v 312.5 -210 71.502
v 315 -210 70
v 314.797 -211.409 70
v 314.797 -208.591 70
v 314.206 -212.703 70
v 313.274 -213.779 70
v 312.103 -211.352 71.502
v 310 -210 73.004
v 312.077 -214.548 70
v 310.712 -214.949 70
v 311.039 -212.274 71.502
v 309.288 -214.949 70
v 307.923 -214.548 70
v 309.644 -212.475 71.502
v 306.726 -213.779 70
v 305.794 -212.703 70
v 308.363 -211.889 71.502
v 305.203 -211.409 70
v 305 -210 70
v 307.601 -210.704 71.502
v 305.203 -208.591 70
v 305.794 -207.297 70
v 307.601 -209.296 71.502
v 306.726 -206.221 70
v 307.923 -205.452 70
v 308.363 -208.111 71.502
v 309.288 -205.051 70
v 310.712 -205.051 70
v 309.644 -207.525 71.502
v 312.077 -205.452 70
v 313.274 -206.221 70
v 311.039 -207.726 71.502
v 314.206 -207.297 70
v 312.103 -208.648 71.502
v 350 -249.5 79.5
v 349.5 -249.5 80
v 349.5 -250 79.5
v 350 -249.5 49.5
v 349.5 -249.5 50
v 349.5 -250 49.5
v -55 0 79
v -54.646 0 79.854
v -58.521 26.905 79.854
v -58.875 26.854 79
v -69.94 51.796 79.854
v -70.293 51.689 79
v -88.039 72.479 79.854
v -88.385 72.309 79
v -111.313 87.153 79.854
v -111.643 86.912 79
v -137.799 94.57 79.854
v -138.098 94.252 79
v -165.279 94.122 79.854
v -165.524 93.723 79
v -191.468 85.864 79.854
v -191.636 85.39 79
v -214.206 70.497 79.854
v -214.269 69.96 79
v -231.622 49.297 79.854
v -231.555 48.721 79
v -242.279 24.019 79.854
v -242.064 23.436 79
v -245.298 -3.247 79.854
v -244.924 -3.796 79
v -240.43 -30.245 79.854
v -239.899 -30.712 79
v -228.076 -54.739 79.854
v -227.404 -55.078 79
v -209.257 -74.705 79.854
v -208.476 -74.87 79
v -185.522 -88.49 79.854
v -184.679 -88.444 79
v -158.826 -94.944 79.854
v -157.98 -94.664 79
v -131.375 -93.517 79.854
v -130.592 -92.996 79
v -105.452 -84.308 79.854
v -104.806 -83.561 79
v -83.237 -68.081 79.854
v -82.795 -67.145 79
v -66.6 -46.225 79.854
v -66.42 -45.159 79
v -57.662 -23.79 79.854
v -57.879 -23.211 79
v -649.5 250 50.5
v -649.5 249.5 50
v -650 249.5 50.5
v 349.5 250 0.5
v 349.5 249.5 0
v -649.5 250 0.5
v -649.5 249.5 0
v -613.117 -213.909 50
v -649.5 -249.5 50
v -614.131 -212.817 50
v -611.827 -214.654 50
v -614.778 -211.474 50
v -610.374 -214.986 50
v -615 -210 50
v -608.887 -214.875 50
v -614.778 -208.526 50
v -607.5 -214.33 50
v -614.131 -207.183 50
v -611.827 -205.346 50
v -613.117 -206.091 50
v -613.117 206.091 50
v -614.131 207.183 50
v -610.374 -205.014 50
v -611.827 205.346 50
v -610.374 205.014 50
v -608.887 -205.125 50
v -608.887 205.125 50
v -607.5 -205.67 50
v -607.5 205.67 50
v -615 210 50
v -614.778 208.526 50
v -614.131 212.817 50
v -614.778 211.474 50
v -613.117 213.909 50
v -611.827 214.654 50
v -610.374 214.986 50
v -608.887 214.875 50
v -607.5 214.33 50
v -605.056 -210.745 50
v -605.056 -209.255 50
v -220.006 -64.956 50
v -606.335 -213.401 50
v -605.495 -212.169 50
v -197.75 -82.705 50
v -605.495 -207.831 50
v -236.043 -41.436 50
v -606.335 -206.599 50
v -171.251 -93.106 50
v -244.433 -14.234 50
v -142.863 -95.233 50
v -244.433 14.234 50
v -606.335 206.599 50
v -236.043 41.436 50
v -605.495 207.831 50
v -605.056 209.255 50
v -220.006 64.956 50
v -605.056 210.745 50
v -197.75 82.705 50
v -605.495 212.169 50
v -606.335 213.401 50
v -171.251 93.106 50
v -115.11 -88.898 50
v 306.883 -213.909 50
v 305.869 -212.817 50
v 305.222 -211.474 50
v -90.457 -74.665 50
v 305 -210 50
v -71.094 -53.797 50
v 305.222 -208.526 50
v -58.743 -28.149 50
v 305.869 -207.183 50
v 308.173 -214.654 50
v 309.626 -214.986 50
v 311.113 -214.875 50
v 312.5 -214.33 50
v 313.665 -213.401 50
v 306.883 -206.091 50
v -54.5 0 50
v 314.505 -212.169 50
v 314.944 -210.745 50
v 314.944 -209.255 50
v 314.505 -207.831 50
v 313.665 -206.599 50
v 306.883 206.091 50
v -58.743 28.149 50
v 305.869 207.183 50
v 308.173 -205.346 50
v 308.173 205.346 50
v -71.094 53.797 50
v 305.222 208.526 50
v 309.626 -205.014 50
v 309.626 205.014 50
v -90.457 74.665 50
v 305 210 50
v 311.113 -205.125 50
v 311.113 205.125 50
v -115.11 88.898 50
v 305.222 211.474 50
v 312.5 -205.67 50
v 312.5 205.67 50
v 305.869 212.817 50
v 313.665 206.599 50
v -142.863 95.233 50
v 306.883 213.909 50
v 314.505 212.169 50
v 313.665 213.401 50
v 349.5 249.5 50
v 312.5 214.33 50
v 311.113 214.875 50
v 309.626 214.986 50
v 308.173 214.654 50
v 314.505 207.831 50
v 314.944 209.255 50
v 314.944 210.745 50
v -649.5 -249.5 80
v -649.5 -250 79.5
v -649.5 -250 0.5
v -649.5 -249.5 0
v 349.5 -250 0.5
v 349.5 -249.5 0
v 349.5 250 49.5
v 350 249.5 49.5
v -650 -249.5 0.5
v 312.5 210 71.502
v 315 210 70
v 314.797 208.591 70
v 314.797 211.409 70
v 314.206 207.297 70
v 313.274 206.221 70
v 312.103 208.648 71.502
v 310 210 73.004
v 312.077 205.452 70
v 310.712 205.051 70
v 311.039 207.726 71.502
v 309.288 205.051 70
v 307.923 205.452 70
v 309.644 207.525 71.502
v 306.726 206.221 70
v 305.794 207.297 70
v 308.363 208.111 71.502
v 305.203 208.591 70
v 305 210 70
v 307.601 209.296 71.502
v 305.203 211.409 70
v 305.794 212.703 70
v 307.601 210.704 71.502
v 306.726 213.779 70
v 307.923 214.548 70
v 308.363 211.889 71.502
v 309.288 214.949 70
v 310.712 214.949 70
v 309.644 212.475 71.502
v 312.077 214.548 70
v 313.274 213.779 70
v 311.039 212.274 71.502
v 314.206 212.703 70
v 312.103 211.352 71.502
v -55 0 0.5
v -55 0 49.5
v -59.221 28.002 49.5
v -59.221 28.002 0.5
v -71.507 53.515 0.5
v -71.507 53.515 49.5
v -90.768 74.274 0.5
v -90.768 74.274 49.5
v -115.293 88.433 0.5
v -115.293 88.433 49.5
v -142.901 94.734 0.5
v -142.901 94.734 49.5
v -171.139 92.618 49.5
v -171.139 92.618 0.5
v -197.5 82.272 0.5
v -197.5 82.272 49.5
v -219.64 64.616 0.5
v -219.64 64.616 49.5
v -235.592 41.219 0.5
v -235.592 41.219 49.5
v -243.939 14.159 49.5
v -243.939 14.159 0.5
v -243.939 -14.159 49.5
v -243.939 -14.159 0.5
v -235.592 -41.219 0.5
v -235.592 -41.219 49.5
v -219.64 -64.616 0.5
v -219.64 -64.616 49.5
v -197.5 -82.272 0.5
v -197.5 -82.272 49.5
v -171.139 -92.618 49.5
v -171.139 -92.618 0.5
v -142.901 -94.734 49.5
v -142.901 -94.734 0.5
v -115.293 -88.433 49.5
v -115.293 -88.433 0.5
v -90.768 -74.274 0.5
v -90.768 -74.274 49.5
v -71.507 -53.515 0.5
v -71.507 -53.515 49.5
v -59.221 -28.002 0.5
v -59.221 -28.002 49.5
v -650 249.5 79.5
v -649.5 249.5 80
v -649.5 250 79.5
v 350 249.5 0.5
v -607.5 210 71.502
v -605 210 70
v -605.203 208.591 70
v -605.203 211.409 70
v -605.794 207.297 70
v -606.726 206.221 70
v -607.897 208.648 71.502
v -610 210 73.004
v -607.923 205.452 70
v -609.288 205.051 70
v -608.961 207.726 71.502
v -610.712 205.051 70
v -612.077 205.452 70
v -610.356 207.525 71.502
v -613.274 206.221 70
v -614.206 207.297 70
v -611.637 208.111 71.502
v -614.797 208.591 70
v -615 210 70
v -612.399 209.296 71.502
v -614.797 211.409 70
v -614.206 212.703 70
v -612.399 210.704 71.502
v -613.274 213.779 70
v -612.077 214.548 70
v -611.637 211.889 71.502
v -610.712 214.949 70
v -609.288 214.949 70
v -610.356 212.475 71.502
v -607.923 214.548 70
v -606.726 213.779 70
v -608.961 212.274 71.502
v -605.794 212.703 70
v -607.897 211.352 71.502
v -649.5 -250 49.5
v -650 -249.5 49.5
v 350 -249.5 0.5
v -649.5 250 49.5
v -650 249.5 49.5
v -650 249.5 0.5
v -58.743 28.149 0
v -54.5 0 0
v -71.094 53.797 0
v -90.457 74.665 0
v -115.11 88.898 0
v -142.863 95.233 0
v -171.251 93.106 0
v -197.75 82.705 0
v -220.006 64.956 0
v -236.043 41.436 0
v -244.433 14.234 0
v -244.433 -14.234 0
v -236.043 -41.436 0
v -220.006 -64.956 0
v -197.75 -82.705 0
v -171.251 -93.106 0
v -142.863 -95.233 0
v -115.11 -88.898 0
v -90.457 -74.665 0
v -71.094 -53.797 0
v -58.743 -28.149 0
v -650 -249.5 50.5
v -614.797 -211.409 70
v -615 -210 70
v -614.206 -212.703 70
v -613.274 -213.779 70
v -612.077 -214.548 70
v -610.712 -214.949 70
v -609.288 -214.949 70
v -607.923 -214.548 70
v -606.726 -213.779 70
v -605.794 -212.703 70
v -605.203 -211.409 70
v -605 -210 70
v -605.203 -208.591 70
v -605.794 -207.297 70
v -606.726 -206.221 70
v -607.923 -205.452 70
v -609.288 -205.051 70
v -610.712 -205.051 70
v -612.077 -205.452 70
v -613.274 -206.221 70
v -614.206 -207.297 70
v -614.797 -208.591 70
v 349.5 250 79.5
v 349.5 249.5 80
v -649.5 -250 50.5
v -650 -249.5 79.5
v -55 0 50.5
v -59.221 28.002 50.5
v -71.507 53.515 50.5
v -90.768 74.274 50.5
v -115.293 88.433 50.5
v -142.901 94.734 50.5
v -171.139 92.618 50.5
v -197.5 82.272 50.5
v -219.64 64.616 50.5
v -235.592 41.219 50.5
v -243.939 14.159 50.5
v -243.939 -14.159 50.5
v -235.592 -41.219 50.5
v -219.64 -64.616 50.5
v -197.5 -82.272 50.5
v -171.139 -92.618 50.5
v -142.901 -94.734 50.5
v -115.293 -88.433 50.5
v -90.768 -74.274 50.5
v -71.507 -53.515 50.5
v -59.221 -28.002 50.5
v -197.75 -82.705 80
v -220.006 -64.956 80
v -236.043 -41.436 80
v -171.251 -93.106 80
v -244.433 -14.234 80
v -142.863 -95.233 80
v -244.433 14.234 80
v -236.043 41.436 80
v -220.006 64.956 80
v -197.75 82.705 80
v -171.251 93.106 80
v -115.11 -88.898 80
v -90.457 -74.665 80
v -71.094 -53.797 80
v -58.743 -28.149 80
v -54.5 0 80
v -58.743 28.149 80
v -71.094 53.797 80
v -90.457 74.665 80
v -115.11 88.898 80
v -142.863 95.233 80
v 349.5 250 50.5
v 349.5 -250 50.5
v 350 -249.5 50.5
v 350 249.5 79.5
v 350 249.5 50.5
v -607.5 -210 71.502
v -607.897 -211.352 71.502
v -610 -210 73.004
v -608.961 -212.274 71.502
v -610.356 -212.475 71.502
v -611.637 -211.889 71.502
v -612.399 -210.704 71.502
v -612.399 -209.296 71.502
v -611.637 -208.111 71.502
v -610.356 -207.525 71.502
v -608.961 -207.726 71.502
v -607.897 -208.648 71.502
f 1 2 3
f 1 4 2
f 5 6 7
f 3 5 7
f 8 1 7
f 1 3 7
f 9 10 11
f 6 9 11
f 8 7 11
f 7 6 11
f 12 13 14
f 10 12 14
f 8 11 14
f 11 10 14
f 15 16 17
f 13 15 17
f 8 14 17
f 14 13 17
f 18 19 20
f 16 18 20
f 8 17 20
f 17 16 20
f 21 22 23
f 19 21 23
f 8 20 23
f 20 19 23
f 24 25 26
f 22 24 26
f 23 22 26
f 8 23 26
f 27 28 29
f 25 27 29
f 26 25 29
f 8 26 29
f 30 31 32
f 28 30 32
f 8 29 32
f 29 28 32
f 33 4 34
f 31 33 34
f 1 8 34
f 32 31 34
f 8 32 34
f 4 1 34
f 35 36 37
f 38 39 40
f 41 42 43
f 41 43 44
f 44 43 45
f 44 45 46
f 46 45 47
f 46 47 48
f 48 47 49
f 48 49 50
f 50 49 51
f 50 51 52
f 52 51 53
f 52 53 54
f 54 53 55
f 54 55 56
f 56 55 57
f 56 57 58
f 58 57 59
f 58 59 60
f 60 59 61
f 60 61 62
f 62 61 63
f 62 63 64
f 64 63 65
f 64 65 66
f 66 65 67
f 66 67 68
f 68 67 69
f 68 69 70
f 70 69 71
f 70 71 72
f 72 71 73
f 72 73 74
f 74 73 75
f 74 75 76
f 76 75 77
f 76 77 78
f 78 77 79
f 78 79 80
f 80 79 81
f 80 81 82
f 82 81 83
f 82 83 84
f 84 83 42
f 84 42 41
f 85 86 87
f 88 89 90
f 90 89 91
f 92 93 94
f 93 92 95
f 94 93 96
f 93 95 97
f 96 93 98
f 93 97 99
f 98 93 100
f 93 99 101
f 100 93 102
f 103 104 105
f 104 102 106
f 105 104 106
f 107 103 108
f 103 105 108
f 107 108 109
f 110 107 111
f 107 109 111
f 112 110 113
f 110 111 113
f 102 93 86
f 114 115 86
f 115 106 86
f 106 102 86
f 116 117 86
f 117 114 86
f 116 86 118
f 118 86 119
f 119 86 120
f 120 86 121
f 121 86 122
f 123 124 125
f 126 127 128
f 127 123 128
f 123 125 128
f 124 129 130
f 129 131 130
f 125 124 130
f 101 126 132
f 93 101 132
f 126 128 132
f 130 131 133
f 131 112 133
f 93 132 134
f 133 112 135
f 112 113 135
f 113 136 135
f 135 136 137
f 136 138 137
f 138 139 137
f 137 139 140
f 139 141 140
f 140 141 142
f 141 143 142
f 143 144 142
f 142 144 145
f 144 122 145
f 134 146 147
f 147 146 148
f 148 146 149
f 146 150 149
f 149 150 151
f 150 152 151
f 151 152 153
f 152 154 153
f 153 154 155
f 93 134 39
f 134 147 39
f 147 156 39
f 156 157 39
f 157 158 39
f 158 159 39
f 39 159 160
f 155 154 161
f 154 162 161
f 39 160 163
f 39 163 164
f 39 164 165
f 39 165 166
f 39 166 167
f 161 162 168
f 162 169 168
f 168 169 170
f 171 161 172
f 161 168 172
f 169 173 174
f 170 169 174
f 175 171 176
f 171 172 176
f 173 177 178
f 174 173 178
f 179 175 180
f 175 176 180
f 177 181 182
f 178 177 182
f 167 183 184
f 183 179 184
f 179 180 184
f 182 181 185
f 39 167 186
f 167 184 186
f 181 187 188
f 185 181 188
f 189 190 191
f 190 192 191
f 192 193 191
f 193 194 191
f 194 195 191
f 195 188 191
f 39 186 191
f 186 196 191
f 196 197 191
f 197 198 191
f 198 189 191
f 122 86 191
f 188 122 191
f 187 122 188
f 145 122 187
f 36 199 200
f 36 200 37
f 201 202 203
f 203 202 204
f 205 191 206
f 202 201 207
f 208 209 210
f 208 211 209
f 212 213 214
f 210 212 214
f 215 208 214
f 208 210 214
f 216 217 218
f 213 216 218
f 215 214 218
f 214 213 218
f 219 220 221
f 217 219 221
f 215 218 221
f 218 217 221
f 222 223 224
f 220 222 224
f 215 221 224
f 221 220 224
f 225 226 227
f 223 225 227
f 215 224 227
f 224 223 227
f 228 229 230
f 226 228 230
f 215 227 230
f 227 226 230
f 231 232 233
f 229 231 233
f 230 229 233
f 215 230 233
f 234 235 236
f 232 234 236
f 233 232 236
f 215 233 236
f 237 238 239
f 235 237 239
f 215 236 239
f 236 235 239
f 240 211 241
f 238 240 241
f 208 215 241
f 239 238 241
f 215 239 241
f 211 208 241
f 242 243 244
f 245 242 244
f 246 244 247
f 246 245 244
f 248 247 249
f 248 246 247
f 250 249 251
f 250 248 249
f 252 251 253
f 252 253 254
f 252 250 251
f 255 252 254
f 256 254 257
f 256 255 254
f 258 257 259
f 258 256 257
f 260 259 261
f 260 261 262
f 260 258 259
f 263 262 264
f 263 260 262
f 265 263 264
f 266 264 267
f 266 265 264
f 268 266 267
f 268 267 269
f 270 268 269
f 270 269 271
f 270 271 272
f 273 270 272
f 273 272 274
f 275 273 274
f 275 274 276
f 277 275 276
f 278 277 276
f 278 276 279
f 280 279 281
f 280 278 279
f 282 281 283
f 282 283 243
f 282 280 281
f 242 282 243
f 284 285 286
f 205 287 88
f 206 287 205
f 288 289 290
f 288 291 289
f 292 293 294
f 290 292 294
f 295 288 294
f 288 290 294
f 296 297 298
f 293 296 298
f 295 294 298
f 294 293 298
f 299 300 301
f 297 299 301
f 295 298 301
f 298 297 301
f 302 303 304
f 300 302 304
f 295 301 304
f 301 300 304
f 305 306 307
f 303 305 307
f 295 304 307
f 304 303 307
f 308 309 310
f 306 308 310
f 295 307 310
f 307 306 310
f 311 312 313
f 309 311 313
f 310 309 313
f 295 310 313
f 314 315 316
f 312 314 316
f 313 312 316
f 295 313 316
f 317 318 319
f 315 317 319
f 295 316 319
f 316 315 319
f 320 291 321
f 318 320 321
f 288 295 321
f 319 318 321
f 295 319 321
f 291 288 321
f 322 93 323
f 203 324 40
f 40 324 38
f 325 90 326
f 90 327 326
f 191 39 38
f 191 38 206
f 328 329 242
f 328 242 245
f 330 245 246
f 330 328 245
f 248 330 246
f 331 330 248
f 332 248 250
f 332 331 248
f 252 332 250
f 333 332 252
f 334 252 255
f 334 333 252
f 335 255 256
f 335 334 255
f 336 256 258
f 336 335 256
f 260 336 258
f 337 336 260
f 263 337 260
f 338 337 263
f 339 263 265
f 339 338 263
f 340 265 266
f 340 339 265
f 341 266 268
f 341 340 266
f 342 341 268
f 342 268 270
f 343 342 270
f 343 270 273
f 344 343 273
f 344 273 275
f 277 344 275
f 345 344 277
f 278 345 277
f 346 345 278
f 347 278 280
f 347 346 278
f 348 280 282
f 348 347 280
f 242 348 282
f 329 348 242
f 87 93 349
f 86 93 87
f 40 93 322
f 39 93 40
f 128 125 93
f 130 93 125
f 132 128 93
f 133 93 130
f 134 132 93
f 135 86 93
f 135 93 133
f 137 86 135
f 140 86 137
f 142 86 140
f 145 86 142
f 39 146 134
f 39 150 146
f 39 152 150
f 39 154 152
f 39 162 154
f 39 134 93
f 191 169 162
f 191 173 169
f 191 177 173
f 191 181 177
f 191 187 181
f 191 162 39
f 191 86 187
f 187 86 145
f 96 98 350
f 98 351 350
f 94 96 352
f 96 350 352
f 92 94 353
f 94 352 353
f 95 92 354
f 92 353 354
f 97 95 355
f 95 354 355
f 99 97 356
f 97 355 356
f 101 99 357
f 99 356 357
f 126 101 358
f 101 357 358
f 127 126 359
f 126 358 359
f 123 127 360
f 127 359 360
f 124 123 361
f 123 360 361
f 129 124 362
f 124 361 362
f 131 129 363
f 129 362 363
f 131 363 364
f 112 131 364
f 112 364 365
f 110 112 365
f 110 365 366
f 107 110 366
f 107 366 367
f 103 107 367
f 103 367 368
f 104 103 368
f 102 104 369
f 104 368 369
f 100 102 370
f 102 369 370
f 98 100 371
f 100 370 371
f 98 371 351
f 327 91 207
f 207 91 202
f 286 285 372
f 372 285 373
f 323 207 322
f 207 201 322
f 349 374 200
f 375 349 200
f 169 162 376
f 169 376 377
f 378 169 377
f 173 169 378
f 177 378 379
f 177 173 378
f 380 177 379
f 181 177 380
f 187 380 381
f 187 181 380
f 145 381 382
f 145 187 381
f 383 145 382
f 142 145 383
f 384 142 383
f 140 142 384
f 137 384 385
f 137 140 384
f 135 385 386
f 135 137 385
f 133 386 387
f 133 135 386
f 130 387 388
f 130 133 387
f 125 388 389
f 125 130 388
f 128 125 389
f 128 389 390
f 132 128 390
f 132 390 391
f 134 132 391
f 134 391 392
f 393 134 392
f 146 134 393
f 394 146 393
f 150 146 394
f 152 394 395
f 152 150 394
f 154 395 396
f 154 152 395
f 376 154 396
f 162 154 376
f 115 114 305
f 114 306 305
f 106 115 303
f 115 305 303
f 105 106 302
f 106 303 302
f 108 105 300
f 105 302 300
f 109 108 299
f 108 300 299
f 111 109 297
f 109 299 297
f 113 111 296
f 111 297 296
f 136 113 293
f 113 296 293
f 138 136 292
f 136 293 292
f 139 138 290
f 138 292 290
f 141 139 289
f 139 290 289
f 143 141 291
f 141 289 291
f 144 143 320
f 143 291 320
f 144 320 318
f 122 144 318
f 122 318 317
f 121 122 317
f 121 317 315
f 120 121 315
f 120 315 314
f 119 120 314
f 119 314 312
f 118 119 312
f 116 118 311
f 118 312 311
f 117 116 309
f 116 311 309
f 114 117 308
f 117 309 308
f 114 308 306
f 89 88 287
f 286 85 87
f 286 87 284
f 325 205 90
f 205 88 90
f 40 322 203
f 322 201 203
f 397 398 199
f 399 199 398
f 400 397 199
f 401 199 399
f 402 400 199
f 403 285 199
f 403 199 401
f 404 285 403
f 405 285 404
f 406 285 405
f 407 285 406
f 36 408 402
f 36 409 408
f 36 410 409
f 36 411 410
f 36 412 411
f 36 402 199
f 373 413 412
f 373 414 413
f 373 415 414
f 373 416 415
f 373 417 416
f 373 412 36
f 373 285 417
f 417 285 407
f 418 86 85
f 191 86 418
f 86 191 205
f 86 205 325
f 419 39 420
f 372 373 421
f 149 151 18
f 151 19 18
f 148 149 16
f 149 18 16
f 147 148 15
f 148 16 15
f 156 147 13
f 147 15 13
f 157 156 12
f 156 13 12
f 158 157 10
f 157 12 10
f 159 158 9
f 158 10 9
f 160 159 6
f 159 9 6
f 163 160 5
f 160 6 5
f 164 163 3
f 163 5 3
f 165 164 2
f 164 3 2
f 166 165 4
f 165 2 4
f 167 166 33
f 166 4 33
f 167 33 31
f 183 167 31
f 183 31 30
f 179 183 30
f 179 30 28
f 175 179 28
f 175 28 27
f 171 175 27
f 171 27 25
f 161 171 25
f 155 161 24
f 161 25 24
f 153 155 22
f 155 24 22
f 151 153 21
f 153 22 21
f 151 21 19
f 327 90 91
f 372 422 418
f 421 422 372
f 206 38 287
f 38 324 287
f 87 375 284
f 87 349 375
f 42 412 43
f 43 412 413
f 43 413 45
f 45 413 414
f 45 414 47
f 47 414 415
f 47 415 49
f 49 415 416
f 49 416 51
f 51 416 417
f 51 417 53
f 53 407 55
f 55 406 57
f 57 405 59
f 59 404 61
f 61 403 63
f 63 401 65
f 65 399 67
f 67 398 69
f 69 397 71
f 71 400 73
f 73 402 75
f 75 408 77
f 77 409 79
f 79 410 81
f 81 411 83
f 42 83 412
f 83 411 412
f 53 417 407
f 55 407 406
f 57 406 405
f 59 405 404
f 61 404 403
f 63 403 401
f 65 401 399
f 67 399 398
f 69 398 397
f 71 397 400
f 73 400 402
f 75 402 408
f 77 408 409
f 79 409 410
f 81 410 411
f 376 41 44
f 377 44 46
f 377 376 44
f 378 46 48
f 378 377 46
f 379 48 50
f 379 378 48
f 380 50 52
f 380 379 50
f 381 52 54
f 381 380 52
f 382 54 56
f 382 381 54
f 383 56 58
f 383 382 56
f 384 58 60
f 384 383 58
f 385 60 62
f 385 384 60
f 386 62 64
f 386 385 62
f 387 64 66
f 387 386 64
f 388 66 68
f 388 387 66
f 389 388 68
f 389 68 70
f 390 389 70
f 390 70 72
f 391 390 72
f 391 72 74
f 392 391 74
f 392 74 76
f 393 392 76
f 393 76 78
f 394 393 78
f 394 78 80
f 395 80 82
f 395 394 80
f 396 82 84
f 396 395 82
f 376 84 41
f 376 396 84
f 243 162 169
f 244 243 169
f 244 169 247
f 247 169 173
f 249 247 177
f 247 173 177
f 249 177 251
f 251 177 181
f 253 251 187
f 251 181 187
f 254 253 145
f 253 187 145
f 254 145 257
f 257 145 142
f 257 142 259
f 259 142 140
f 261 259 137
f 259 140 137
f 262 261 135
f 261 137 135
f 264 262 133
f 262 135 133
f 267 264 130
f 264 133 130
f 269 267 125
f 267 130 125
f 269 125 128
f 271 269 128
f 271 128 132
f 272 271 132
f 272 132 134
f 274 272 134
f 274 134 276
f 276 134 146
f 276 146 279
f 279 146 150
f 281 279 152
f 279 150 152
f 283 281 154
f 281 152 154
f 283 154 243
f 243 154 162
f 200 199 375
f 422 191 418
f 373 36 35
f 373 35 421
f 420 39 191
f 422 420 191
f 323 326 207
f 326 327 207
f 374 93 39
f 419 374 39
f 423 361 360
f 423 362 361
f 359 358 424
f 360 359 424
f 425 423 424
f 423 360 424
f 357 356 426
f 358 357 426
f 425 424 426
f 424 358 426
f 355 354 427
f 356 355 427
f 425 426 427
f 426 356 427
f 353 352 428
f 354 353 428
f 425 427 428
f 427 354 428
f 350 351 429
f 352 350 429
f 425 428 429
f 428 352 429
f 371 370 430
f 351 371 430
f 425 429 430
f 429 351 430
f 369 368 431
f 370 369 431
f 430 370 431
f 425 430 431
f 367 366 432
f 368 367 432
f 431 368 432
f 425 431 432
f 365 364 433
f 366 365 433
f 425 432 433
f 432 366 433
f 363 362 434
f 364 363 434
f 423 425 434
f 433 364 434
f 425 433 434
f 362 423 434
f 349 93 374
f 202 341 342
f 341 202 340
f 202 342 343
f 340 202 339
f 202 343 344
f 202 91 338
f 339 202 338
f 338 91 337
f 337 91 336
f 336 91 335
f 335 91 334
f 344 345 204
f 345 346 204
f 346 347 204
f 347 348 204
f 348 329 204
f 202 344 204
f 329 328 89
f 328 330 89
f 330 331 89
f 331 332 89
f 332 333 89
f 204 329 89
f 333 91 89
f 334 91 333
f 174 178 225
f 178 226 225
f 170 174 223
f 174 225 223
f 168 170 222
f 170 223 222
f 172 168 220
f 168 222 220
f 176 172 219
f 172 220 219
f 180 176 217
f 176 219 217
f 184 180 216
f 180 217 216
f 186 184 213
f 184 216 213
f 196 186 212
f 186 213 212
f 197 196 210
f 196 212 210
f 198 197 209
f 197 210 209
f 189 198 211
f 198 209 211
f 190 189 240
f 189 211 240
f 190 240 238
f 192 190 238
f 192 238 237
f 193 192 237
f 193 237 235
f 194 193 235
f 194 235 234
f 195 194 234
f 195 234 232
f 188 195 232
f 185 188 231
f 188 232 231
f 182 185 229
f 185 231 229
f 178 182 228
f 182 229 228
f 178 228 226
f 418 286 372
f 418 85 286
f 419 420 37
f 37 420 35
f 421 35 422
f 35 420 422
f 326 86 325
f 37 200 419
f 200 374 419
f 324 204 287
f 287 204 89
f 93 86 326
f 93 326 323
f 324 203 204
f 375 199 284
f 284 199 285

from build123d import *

# Parameters (mm, degrees)
F0_R      = 95
F1_DEPTH  = 50
F3_W      = 1000
F3_H      = 500
F3_W_2    = 920
F3_H_2    = 420
F3_R      = 95
F4_DEPTH  = 30
F5_SIZE   = 0.5
F6_D      = 10
F6_DEPTH  = 20
F6_TIP    = 3.0043030951
F7_SIZE   = 0.5
F7_2_SIZE = 0.5


# Not quite as in the source:
# - a feature names something its author has since deleted; it is built from what else it names


with BuildPart() as f1:
    # F0 (on Top) → F1 (new body)
    with BuildSketch(Plane.XY):
        with BuildLine():
            Line((330, 75), (350, 75))
            Line((350, 75), (350, 250))
            Line((350, 250), (-650, 250))
            Line((-650, 250), (-650, 75))
            Line((-650, 75), (-630, 75))
            ThreePointArc((-630, 75), (-622.9289321881, 72.0710678119), (-620, 65))
            Line((-620, 65), (-620, 0))
            Line((-620, 0), (-620, -65))
            ThreePointArc((-620, -65), (-622.9289321881, -72.0710678119), (-630, -75))
            Line((-630, -75), (-650, -75))
            Line((-650, -75), (-650, -250))
            Line((-650, -250), (350, -250))
            Line((350, -250), (350, -75))
            Line((350, -75), (330, -75))
            ThreePointArc((330, -75), (322.9289321881, -72.0710678119), (320, -65))
            Line((320, -65), (320, 65))
            ThreePointArc((320, 65), (322.9289321881, 72.0710678119), (330, 75))
        make_face()
        with Locations((-150, 0)):
            Circle(F0_R, mode=Mode.SUBTRACT)
        with BuildLine():
            Line((350, -75), (350, 75))
            Line((350, 75), (330, 75))
            ThreePointArc((330, 75), (322.9289321881, 72.0710678119), (320, 65))
            Line((320, 65), (320, -65))
            ThreePointArc((320, -65), (322.9289321881, -72.0710678119), (330, -75))
            Line((330, -75), (350, -75))
        make_face()
        with BuildLine():
            Line((-650, 0), (-650, -75))
            Line((-650, -75), (-630, -75))
            ThreePointArc((-630, -75), (-622.9289321881, -72.0710678119), (-620, -65))
            Line((-620, -65), (-620, 0))
            Line((-620, 0), (-650, 0))
        make_face()
        with BuildLine():
            Line((-630, 75), (-650, 75))
            Line((-650, 75), (-650, 0))
            Line((-650, 0), (-620, 0))
            Line((-620, 0), (-620, 65))
            ThreePointArc((-620, 65), (-622.9289321881, 72.0710678119), (-630, 75))
        make_face()
    extrude(amount=F1_DEPTH)

    # F7
    f7_edges = [f1.edges().sort_by_distance(p)[0] for p in [
        (-150, -250, 50),
        (350, 0, 50),
        (-150, 250, 50),
        (-650, 0, 50),
        (-245, 0, 50),
        (-650, -250, 25),
        (350, -250, 25),
        (-150, -250, 0),
        (350, 250, 25),
        (-650, 250, 25),
        (-150, 250, 0),
        (350, 0, 0),
        (-650, 0, 0),
        (-245, 0, 0),
    ]]
    chamfer(f7_edges, length=F7_SIZE)


with BuildPart() as f4:
    # F3 (on face) → F4 (new body)
    with BuildSketch(Plane.XY.offset(50)):
        with Locations((-150, 0)):
            Rectangle(F3_W, F3_H)
        with Locations((-150, 0)):
            Rectangle(F3_W_2, F3_H_2, mode=Mode.SUBTRACT)
        with Locations((-150, 0)):
            Rectangle(F3_W_2, F3_H_2)
        with Locations((-150, 0)):
            Circle(F3_R, mode=Mode.SUBTRACT)
    extrude(amount=F4_DEPTH)

    # F5
    f5_edges = [f4.edges().sort_by_distance(p)[0] for p in [
        (-150, 250, 80),
        (-650, 0, 80),
        (-150, -250, 80),
        (350, 0, 80),
        (-245, 0, 80),
        (-150, 250, 50),
        (-650, 0, 50),
        (-150, -250, 50),
        (350, 0, 50),
        (-245, 0, 50),
        (350, 250, 65),
        (-650, 250, 65),
        (-650, -250, 65),
        (350, -250, 65),
    ]]
    chamfer(f5_edges, length=F5_SIZE)

    # F6
    with Locations(Plane(origin=(0, 0, 50), x_dir=(1, 0, 0), z_dir=(0, 0, -1))):
        with Locations((-610, -210), (310, -210), (310, 210), (-610, 210)):
            Hole(F6_D / 2, depth=F6_DEPTH)
            with Locations((0, 0, -(F6_DEPTH + F6_TIP / 2))):  # 118° drill point
                Cone(0, F6_D / 2, F6_TIP, mode=Mode.SUBTRACT)

    # F7#2
    f7_2_edges = [f4.edges().sort_by_distance(p)[0] for p in [
        (-245, 0, 79.5),
    ]]
    chamfer(f7_2_edges, length=F7_2_SIZE)


solid = Compound([f1.part, f4.part])
